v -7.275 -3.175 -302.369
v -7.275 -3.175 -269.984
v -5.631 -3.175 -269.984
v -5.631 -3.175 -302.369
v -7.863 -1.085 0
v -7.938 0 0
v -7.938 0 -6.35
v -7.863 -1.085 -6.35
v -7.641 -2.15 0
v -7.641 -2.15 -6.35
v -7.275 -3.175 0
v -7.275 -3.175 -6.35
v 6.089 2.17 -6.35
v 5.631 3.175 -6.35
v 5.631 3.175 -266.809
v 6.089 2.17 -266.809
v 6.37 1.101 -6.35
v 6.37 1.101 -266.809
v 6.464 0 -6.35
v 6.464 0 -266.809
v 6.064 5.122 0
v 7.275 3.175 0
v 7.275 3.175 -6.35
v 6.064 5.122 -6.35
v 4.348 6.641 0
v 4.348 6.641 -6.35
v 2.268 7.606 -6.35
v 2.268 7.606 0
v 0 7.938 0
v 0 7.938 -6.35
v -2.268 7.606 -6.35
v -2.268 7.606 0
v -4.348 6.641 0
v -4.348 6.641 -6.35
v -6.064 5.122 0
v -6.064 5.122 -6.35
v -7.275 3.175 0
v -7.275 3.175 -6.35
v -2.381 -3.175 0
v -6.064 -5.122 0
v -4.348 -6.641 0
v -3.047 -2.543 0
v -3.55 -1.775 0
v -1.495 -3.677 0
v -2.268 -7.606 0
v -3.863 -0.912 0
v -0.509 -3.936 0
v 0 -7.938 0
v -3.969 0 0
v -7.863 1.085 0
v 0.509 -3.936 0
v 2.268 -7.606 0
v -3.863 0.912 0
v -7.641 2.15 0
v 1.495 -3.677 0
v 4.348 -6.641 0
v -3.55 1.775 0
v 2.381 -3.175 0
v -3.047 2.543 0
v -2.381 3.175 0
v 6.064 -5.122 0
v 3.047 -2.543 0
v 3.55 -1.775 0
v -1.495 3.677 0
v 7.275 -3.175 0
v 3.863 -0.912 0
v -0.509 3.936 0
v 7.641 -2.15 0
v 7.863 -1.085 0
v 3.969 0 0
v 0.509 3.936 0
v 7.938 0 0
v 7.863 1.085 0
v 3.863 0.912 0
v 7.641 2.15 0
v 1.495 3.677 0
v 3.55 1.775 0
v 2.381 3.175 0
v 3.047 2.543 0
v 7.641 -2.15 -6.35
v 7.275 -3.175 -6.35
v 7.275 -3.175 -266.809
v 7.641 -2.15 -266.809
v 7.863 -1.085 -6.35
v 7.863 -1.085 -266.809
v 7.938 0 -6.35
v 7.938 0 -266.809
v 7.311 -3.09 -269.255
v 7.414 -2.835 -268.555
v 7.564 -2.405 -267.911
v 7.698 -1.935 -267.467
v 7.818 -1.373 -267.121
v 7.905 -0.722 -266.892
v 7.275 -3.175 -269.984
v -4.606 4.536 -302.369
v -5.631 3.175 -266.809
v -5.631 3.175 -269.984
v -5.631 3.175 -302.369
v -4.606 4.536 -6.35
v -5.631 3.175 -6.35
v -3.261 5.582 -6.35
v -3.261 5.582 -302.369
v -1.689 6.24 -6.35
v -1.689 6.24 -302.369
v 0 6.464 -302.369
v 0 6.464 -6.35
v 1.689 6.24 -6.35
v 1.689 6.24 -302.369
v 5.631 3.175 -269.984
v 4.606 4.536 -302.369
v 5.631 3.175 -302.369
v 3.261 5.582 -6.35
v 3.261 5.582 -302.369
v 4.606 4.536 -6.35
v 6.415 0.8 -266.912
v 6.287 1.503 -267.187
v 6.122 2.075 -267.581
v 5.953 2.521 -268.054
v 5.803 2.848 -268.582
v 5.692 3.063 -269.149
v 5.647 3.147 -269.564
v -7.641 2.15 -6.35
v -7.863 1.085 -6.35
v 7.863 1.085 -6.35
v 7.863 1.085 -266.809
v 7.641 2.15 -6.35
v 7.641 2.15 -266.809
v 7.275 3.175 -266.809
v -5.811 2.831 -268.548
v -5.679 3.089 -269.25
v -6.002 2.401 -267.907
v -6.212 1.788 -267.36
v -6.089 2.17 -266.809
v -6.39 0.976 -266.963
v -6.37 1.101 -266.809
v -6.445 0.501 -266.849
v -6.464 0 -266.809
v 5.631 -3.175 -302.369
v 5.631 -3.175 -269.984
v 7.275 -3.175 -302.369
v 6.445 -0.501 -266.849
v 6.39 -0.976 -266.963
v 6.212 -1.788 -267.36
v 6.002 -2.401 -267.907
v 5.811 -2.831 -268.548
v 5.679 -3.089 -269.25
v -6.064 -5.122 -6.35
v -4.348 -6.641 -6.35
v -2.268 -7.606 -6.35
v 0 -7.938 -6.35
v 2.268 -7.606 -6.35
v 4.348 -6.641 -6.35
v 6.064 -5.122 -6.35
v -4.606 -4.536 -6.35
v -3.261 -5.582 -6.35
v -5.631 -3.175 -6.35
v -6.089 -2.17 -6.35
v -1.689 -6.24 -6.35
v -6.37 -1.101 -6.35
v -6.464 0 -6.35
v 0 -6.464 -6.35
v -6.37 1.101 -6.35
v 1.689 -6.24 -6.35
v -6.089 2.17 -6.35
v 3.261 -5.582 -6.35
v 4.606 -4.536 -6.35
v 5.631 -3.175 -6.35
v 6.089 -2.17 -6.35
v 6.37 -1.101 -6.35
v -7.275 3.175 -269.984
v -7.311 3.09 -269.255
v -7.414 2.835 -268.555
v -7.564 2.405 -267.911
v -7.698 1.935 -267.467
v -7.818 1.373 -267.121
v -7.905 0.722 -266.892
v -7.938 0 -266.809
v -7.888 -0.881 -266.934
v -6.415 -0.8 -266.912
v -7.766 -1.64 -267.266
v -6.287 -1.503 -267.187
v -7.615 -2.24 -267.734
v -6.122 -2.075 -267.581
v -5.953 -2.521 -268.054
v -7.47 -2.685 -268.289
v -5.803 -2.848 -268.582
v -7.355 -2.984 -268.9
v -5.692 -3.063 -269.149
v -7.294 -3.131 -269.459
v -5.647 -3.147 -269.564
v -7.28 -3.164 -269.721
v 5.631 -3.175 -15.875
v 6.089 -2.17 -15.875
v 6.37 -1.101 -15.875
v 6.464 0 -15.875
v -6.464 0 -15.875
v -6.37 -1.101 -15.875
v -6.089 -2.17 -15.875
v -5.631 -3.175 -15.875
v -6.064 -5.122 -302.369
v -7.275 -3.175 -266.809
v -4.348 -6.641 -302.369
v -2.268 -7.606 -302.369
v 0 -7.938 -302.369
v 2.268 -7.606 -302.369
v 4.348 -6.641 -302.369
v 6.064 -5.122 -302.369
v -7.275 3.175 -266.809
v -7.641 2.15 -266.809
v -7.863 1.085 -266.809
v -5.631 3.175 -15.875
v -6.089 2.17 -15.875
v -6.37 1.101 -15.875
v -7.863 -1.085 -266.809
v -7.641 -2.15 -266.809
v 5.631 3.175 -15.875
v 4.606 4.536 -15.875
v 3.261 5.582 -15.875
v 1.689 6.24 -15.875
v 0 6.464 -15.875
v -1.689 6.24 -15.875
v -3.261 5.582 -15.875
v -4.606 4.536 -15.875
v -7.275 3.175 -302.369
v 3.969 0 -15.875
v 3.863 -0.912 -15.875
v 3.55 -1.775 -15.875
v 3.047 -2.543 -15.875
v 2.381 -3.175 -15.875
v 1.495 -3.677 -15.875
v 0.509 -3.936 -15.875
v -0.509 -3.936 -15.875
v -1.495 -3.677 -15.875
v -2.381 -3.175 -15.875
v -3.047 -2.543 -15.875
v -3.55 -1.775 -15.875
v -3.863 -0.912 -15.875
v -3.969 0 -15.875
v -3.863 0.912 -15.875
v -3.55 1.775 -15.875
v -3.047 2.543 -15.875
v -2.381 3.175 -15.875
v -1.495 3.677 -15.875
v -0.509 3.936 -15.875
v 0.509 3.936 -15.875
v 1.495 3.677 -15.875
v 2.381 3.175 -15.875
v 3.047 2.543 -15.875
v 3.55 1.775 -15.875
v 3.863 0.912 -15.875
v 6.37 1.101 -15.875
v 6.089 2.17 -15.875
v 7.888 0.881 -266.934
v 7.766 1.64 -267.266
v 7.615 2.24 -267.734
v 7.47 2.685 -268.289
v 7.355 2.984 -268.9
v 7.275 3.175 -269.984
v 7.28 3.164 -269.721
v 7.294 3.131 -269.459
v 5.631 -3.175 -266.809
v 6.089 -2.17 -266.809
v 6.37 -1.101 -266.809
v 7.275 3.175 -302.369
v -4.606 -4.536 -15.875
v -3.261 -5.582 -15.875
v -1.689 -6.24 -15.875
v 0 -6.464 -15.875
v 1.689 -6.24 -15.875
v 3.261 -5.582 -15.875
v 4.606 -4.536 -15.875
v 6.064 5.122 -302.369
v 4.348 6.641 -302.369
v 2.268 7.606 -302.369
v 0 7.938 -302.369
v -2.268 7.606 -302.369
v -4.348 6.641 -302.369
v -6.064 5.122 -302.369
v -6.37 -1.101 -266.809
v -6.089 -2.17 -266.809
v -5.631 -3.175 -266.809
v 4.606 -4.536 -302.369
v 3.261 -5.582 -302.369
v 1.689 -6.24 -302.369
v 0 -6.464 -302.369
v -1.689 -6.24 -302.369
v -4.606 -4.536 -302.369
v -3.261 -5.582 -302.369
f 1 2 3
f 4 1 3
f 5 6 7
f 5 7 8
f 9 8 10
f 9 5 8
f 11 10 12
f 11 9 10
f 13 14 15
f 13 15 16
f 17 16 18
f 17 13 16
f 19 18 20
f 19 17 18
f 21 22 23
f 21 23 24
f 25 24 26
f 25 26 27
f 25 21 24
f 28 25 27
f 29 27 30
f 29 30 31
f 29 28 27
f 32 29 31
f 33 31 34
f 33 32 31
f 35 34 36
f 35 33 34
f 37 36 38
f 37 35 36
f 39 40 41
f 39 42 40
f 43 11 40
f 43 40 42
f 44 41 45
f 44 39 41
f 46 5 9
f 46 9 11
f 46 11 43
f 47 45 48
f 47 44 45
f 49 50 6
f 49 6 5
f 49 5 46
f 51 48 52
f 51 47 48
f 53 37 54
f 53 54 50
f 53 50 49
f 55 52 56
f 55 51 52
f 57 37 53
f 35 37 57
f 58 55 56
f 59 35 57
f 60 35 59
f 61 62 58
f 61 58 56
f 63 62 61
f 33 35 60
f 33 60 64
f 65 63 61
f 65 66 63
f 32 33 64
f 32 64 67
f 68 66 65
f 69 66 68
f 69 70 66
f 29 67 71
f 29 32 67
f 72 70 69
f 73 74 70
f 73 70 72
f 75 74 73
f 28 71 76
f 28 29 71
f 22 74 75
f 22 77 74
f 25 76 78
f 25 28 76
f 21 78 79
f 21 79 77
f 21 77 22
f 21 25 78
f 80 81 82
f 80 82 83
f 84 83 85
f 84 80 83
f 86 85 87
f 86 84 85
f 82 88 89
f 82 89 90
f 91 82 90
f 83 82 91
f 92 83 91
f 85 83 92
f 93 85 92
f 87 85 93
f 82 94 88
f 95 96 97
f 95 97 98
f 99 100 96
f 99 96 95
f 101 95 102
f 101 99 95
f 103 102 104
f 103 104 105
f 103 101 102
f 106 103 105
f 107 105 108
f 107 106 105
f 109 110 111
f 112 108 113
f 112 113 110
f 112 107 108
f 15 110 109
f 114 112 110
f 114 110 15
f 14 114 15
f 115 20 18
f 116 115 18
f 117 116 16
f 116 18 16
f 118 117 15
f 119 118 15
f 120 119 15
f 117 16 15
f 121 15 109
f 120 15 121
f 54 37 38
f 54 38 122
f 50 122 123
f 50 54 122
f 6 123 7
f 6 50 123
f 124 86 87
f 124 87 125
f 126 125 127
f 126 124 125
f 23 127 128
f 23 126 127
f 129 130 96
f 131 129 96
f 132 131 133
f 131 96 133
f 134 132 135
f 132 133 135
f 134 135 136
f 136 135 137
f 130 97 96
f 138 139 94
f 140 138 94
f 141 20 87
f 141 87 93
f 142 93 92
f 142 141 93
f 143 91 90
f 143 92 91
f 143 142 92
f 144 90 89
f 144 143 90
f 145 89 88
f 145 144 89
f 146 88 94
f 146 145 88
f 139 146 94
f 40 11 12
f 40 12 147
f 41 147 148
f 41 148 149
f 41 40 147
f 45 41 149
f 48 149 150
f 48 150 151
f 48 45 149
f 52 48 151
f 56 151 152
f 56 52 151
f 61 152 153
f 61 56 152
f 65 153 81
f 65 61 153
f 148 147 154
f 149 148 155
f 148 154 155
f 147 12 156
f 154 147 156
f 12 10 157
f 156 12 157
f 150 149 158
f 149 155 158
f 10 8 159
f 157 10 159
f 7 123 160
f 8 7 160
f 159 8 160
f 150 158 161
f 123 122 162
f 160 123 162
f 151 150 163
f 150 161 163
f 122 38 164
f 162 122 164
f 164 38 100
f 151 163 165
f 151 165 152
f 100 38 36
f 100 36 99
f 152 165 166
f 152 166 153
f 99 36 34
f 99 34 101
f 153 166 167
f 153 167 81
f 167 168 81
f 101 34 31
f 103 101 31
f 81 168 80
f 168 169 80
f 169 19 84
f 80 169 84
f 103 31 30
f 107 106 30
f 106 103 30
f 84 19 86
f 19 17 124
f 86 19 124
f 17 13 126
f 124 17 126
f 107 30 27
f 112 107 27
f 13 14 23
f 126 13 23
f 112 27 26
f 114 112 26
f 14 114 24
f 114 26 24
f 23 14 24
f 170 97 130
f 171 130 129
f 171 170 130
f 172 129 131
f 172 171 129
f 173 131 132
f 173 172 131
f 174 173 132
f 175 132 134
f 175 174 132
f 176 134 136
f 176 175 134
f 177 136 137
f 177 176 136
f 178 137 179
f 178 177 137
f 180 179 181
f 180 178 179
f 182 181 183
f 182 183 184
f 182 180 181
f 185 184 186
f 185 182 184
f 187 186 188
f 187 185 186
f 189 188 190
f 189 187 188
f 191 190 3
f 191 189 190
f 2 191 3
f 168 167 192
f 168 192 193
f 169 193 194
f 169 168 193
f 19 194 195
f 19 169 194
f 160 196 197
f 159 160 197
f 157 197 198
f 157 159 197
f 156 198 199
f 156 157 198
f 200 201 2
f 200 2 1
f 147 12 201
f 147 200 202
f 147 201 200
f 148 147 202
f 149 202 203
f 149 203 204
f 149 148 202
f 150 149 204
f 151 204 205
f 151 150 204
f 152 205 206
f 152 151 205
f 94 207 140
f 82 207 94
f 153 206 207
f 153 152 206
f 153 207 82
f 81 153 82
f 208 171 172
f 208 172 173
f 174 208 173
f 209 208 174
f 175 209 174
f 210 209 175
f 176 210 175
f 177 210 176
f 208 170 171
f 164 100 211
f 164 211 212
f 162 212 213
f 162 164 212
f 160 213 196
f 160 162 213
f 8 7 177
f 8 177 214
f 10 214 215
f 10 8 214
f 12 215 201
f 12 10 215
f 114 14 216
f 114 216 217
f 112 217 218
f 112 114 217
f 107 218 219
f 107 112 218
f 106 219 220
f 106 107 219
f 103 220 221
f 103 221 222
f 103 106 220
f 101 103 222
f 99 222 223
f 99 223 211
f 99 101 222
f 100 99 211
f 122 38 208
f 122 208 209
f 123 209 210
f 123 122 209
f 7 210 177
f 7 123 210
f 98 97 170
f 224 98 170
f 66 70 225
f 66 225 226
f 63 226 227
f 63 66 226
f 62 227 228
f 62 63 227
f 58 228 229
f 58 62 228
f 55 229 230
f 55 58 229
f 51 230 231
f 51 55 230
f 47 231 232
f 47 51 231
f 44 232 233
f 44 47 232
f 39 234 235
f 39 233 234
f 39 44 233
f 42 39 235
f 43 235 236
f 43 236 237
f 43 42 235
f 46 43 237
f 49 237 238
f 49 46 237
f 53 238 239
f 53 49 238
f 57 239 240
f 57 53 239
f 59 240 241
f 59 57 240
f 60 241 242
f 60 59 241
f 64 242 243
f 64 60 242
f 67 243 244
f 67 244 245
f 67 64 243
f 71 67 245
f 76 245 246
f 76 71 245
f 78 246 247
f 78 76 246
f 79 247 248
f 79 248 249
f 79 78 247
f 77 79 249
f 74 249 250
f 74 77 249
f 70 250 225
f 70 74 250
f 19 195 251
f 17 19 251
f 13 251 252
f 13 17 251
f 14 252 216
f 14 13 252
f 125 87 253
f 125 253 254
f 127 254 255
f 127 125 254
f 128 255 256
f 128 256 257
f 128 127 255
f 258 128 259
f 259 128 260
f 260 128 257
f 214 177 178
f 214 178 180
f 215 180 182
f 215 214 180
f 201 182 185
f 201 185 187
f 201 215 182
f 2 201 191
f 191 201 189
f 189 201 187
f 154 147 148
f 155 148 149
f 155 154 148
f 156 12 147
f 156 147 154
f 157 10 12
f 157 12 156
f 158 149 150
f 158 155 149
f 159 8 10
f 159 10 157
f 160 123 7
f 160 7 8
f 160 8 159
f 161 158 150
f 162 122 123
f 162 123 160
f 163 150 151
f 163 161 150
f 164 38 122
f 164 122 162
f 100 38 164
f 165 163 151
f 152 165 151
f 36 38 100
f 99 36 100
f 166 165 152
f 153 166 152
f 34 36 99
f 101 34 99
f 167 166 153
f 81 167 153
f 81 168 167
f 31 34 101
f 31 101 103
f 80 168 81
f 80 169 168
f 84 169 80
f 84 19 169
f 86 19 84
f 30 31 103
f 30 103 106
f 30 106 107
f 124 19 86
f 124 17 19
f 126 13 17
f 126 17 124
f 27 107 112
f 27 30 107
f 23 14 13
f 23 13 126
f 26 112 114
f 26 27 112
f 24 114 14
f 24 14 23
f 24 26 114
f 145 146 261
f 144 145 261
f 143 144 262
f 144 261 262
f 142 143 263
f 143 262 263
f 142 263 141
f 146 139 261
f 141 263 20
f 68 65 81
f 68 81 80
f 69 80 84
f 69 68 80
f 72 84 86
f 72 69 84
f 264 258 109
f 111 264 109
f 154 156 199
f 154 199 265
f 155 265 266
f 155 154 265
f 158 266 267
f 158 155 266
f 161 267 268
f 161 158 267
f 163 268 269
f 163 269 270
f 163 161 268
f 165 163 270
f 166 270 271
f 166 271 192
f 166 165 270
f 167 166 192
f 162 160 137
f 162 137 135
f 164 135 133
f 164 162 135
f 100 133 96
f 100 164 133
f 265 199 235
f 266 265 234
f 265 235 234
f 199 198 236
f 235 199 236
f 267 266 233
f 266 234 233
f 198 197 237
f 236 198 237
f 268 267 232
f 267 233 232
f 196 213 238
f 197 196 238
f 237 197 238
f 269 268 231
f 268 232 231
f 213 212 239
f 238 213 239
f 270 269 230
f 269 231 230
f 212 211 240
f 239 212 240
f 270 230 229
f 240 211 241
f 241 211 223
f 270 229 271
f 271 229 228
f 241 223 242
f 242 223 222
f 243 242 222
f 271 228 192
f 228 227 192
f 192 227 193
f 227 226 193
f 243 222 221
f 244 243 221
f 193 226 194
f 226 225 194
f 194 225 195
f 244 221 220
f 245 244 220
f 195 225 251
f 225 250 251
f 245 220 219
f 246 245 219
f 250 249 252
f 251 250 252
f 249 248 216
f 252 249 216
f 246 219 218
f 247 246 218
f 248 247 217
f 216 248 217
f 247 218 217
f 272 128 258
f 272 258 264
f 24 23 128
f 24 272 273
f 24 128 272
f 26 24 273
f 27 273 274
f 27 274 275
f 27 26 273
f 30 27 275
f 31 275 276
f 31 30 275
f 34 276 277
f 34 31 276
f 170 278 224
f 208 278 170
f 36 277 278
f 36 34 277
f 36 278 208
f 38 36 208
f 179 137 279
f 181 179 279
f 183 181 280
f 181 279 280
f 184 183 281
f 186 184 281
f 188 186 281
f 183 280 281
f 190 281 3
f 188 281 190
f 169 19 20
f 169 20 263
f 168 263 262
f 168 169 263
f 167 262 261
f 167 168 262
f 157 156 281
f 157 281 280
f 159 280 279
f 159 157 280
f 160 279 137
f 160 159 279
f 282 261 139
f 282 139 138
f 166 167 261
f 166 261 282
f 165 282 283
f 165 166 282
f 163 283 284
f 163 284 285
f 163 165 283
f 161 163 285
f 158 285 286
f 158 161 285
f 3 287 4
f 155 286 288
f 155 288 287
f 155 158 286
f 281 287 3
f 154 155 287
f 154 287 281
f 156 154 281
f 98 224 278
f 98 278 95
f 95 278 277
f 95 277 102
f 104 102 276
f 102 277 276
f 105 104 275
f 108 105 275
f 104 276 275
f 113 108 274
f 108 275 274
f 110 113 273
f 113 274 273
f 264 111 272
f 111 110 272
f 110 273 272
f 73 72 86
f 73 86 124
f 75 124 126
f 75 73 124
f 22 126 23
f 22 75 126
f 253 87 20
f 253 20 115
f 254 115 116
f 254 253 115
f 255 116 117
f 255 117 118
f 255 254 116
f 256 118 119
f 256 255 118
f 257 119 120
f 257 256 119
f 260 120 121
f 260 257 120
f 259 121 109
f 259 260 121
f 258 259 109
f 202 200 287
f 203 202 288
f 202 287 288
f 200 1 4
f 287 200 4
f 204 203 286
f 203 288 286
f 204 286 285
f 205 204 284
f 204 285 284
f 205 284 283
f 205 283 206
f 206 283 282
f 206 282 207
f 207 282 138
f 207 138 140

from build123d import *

# Parameters (mm, degrees)
THREADED_INSERT_1_1_DEPTH = 6.35
THREADED_START            = -6.35
THREADED_INSERT_1_2_DEPTH = 9.525
A_ARM_START               = -6.35
A_ARM_TUBE_DEPTH          = 296.019233
APEX_START                = -266.809233
APEX_SLOT_DEPTH           = 35.56
FILLET1_R                 = 3.175


with BuildPart() as part:
    # Sketch1 → Threaded insert 1-1 (new body)
    with BuildSketch(Plane.XY):
        with BuildLine():
            ThreePointArc((-2.38125, 3.175), (0, 3.96875), (2.38125, 3.175))
            Line((2.38125, 3.175), (5.630856905, 3.175))
            ThreePointArc((5.630856905, 3.175), (0, 6.4643), (-5.630856905, 3.175))
            Line((-5.630856905, 3.175), (-2.38125, 3.175))
        make_face()
        with BuildLine():
            ThreePointArc((-5.630856905, 3.175), (0, 6.4643), (5.630856905, 3.175))
            Line((5.630856905, 3.175), (7.274838916, 3.175))
            ThreePointArc((7.274838916, 3.175), (0, 7.9375), (-7.274838916, 3.175))
            Line((-7.274838916, 3.175), (-5.630856905, 3.175))
        make_face()
        with BuildLine():
            ThreePointArc((2.38125, 3.175), (3.549757914, 1.774878957), (3.96875, 0))
            Line((3.96875, 0), (6.4643, 0))
            ThreePointArc((6.4643, 0), (6.252468424, 1.641283978), (5.630856905, 3.175))
            Line((5.630856905, 3.175), (2.38125, 3.175))
        make_face()
        with BuildLine():
            Line((-6.4643, 0), (-3.96875, 0))
            ThreePointArc((-3.96875, 0), (-3.549757914, 1.774878957), (-2.38125, 3.175))
            Line((-2.38125, 3.175), (-5.630856905, 3.175))
            ThreePointArc((-5.630856905, 3.175), (-6.252468424, 1.641283978), (-6.4643, 0))
        make_face()
        with BuildLine():
            ThreePointArc((5.630856905, 3.175), (6.252468424, 1.641283978), (6.4643, 0))
            Line((6.4643, 0), (7.9375, 0))
            ThreePointArc((7.9375, 0), (7.770068859, 1.621707797), (7.274838916, 3.175))
            Line((7.274838916, 3.175), (5.630856905, 3.175))
        make_face()
        with BuildLine():
            Line((-7.9375, 0), (-6.4643, 0))
            ThreePointArc((-6.4643, 0), (-6.252468424, 1.641283978), (-5.630856905, 3.175))
            Line((-5.630856905, 3.175), (-7.274838916, 3.175))
            ThreePointArc((-7.274838916, 3.175), (-7.770068859, 1.621707797), (-7.9375, 0))
        make_face()
        with BuildLine():
            Line((7.9375, 0), (6.4643, 0))
            ThreePointArc((6.4643, 0), (6.252468424, -1.641283978), (5.630856905, -3.175))
            Line((5.630856905, -3.175), (7.274838916, -3.175))
            ThreePointArc((7.274838916, -3.175), (7.770068859, -1.621707797), (7.9375, 0))
        make_face()
        with BuildLine():
            ThreePointArc((-5.630856905, -3.175), (-6.252468424, -1.641283978), (-6.4643, 0))
            Line((-6.4643, 0), (-7.9375, 0))
            ThreePointArc((-7.9375, 0), (-7.770068859, -1.621707797), (-7.274838916, -3.175))
            Line((-7.274838916, -3.175), (-5.630856905, -3.175))
        make_face()
        with BuildLine():
            Line((6.4643, 0), (3.96875, 0))
            ThreePointArc((3.96875, 0), (3.549757914, -1.774878957), (2.38125, -3.175))
            Line((2.38125, -3.175), (5.630856905, -3.175))
            ThreePointArc((5.630856905, -3.175), (6.252468424, -1.641283978), (6.4643, 0))
        make_face()
        with BuildLine():
            ThreePointArc((-2.38125, -3.175), (-3.549757914, -1.774878957), (-3.96875, 0))
            Line((-3.96875, 0), (-6.4643, 0))
            ThreePointArc((-6.4643, 0), (-6.252468424, -1.641283978), (-5.630856905, -3.175))
            Line((-5.630856905, -3.175), (-2.38125, -3.175))
        make_face()
        with BuildLine():
            Line((5.630856905, -3.175), (2.38125, -3.175))
            ThreePointArc((2.38125, -3.175), (0, -3.96875), (-2.38125, -3.175))
            Line((-2.38125, -3.175), (-5.630856905, -3.175))
            ThreePointArc((-5.630856905, -3.175), (0, -6.4643), (5.630856905, -3.175))
        make_face()
        with BuildLine():
            Line((7.274838916, -3.175), (5.630856905, -3.175))
            ThreePointArc((5.630856905, -3.175), (0, -6.4643), (-5.630856905, -3.175))
            Line((-5.630856905, -3.175), (-7.274838916, -3.175))
            ThreePointArc((-7.274838916, -3.175), (0, -7.9375), (7.274838916, -3.175))
        make_face()
    extrude(amount=-THREADED_INSERT_1_1_DEPTH)

    # Sketch1<3> → Threaded insert 1-2 (add)
    with BuildSketch(Plane.XY.offset(THREADED_START)):
        with BuildLine():
            ThreePointArc((-2.38125, 3.175), (0, 3.96875), (2.38125, 3.175))
            Line((2.38125, 3.175), (5.630856905, 3.175))
            ThreePointArc((5.630856905, 3.175), (0, 6.4643), (-5.630856905, 3.175))
            Line((-5.630856905, 3.175), (-2.38125, 3.175))
        make_face()
        with BuildLine():
            ThreePointArc((2.38125, 3.175), (3.549757914, 1.774878957), (3.96875, 0))
            Line((3.96875, 0), (6.4643, 0))
            ThreePointArc((6.4643, 0), (6.252468424, 1.641283978), (5.630856905, 3.175))
            Line((5.630856905, 3.175), (2.38125, 3.175))
        make_face()
        with BuildLine():
            Line((-6.4643, 0), (-3.96875, 0))
            ThreePointArc((-3.96875, 0), (-3.549757914, 1.774878957), (-2.38125, 3.175))
            Line((-2.38125, 3.175), (-5.630856905, 3.175))
            ThreePointArc((-5.630856905, 3.175), (-6.252468424, 1.641283978), (-6.4643, 0))
        make_face()
        with BuildLine():
            Line((6.4643, 0), (3.96875, 0))
            ThreePointArc((3.96875, 0), (3.549757914, -1.774878957), (2.38125, -3.175))
            Line((2.38125, -3.175), (5.630856905, -3.175))
            ThreePointArc((5.630856905, -3.175), (6.252468424, -1.641283978), (6.4643, 0))
        make_face()
        with BuildLine():
            ThreePointArc((-2.38125, -3.175), (-3.549757914, -1.774878957), (-3.96875, 0))
            Line((-3.96875, 0), (-6.4643, 0))
            ThreePointArc((-6.4643, 0), (-6.252468424, -1.641283978), (-5.630856905, -3.175))
            Line((-5.630856905, -3.175), (-2.38125, -3.175))
        make_face()
        with BuildLine():
            Line((5.630856905, -3.175), (2.38125, -3.175))
            ThreePointArc((2.38125, -3.175), (0, -3.96875), (-2.38125, -3.175))
            Line((-2.38125, -3.175), (-5.630856905, -3.175))
            ThreePointArc((-5.630856905, -3.175), (0, -6.4643), (5.630856905, -3.175))
        make_face()
    extrude(amount=-THREADED_INSERT_1_2_DEPTH)


with BuildPart() as body_2:
    # Sketch1<4> → A-arm tube (new body)
    with BuildSketch(Plane.XY.offset(A_ARM_START)):
        with BuildLine():
            ThreePointArc((-5.630856905, 3.175), (0, 6.4643), (5.630856905, 3.175))
            Line((5.630856905, 3.175), (7.274838916, 3.175))
            ThreePointArc((7.274838916, 3.175), (0, 7.9375), (-7.274838916, 3.175))
            Line((-7.274838916, 3.175), (-5.630856905, 3.175))
        make_face()
        with BuildLine():
            ThreePointArc((5.630856905, 3.175), (6.252468424, 1.641283978), (6.4643, 0))
            Line((6.4643, 0), (7.9375, 0))
            ThreePointArc((7.9375, 0), (7.770068859, 1.621707797), (7.274838916, 3.175))
            Line((7.274838916, 3.175), (5.630856905, 3.175))
        make_face()
        with BuildLine():
            Line((-7.9375, 0), (-6.4643, 0))
            ThreePointArc((-6.4643, 0), (-6.252468424, 1.641283978), (-5.630856905, 3.175))
            Line((-5.630856905, 3.175), (-7.274838916, 3.175))
            ThreePointArc((-7.274838916, 3.175), (-7.770068859, 1.621707797), (-7.9375, 0))
        make_face()
        with BuildLine():
            Line((7.9375, 0), (6.4643, 0))
            ThreePointArc((6.4643, 0), (6.252468424, -1.641283978), (5.630856905, -3.175))
            Line((5.630856905, -3.175), (7.274838916, -3.175))
            ThreePointArc((7.274838916, -3.175), (7.770068859, -1.621707797), (7.9375, 0))
        make_face()
        with BuildLine():
            ThreePointArc((-5.630856905, -3.175), (-6.252468424, -1.641283978), (-6.4643, 0))
            Line((-6.4643, 0), (-7.9375, 0))
            ThreePointArc((-7.9375, 0), (-7.770068859, -1.621707797), (-7.274838916, -3.175))
            Line((-7.274838916, -3.175), (-5.630856905, -3.175))
        make_face()
        with BuildLine():
            Line((7.274838916, -3.175), (5.630856905, -3.175))
            ThreePointArc((5.630856905, -3.175), (0, -6.4643), (-5.630856905, -3.175))
            Line((-5.630856905, -3.175), (-7.274838916, -3.175))
            ThreePointArc((-7.274838916, -3.175), (0, -7.9375), (7.274838916, -3.175))
        make_face()
    extrude(amount=-A_ARM_TUBE_DEPTH)

    # Sketch1<5> → Apex slot (cut)
    with BuildSketch(Plane.XY.offset(APEX_START)):
        with BuildLine():
            ThreePointArc((5.630856905, 3.175), (6.252468424, 1.641283978), (6.4643, 0))
            Line((6.4643, 0), (7.9375, 0))
            ThreePointArc((7.9375, 0), (7.770068859, 1.621707797), (7.274838916, 3.175))
            Line((7.274838916, 3.175), (5.630856905, 3.175))
        make_face()
        with BuildLine():
            Line((-7.9375, 0), (-6.4643, 0))
            ThreePointArc((-6.4643, 0), (-6.252468424, 1.641283978), (-5.630856905, 3.175))
            Line((-5.630856905, 3.175), (-7.274838916, 3.175))
            ThreePointArc((-7.274838916, 3.175), (-7.770068859, 1.621707797), (-7.9375, 0))
        make_face()
        with BuildLine():
            Line((7.9375, 0), (6.4643, 0))
            ThreePointArc((6.4643, 0), (6.252468424, -1.641283978), (5.630856905, -3.175))
            Line((5.630856905, -3.175), (7.274838916, -3.175))
            ThreePointArc((7.274838916, -3.175), (7.770068859, -1.621707797), (7.9375, 0))
        make_face()
        with BuildLine():
            ThreePointArc((-5.630856905, -3.175), (-6.252468424, -1.641283978), (-6.4643, 0))
            Line((-6.4643, 0), (-7.9375, 0))
            ThreePointArc((-7.9375, 0), (-7.770068859, -1.621707797), (-7.274838916, -3.175))
            Line((-7.274838916, -3.175), (-5.630856905, -3.175))
        make_face()
    extrude(amount=-APEX_SLOT_DEPTH, mode=Mode.SUBTRACT)

    # Fillet1
    # the kernel refuses this fillet: 3.175 mm, written as the material it adds along each edge
    with BuildSketch(Plane(origin=(2.306643095, 3.175, -266.809233), x_dir=(0, 0, -1), z_dir=(-1, 0, 0))) as fillet1_piece_1_section:
        with BuildLine():
            CenterArc((FILLET1_R, FILLET1_R), FILLET1_R, 180, 90)
            Line((0, FILLET1_R), (0, 0))
            Line((0, 0), (FILLET1_R, 0))
        make_face()
    fillet1_piece_1 = extrude(amount=17.51898201, mode=Mode.PRIVATE)
    fillet1_piece_1 = fillet1_piece_1 - Plane(origin=(0, 0, -267.52896562), x_dir=(-0.8710698614669244, 0.49115913555994567, 0), z_dir=(0, 0, 1)) * Cylinder(6.4643, 48, mode=Mode.PRIVATE)
    fillet1_piece_1 = fillet1_piece_1 & Plane(origin=(0, 0, -267.52896562), x_dir=(-1, 0, 0), z_dir=(0, 0, 1)) * Cylinder(7.9375, 48, mode=Mode.PRIVATE)
    add(fillet1_piece_1)
    with BuildSketch(Plane(origin=(-15.212338916, -3.175, -266.809233), x_dir=(0, 0, -1), z_dir=(1, 0, 0))) as fillet1_piece_2_section:
        with BuildLine():
            CenterArc((FILLET1_R, FILLET1_R), FILLET1_R, 180, 90)
            Line((0, FILLET1_R), (0, 0))
            Line((0, 0), (FILLET1_R, 0))
        make_face()
    fillet1_piece_2 = extrude(amount=17.51898201, mode=Mode.PRIVATE)
    fillet1_piece_2 = fillet1_piece_2 - Plane(origin=(0, 0, -267.528965783), x_dir=(-0.8710698614669244, 0.49115913555994567, 0), z_dir=(0, 0, 1)) * Cylinder(6.4643, 48, mode=Mode.PRIVATE)
    fillet1_piece_2 = fillet1_piece_2 & Plane(origin=(0, 0, -267.528965783), x_dir=(-1, 0, 0), z_dir=(0, 0, 1)) * Cylinder(7.9375, 48, mode=Mode.PRIVATE)
    add(fillet1_piece_2)
    with BuildSketch(Plane(origin=(-2.306643095, -3.175, -266.809233), x_dir=(0, 0, -1), z_dir=(1, 0, 0))) as fillet1_piece_3_section:
        with BuildLine():
            CenterArc((FILLET1_R, FILLET1_R), FILLET1_R, 180, 90)
            Line((0, FILLET1_R), (0, 0))
            Line((0, 0), (FILLET1_R, 0))
        make_face()
    fillet1_piece_3 = extrude(amount=17.51898201, mode=Mode.PRIVATE)
    fillet1_piece_3 = fillet1_piece_3 - Plane(origin=(0, 0, -267.52896562), x_dir=(-0.8710698614669244, 0.49115913555994567, 0), z_dir=(0, 0, 1)) * Cylinder(6.4643, 48, mode=Mode.PRIVATE)
    fillet1_piece_3 = fillet1_piece_3 & Plane(origin=(0, 0, -267.52896562), x_dir=(-1, 0, 0), z_dir=(0, 0, 1)) * Cylinder(7.9375, 48, mode=Mode.PRIVATE)
    add(fillet1_piece_3)
    with BuildSketch(Plane(origin=(15.212338916, 3.175, -266.809233), x_dir=(0, -1, 0), z_dir=(-1, 0, 0))) as fillet1_piece_4_section:
        with BuildLine():
            CenterArc((FILLET1_R, -FILLET1_R), FILLET1_R, 90, 90)
            Line((0, -FILLET1_R), (0, 0))
            Line((0, 0), (FILLET1_R, 0))
        make_face()
    fillet1_piece_4 = extrude(amount=17.51898201, mode=Mode.PRIVATE)
    fillet1_piece_4 = fillet1_piece_4 - Plane(origin=(0, 0, -267.528965609), x_dir=(-0.8710698614669244, 0.49115913555994567, 0), z_dir=(0, 0, 1)) * Cylinder(6.4643, 48, mode=Mode.PRIVATE)
    fillet1_piece_4 = fillet1_piece_4 & Plane(origin=(0, 0, -267.528965609), x_dir=(-1, 0, 0), z_dir=(0, 0, 1)) * Cylinder(7.9375, 48, mode=Mode.PRIVATE)
    add(fillet1_piece_4)


solid = Compound([part.part, body_2.part])
